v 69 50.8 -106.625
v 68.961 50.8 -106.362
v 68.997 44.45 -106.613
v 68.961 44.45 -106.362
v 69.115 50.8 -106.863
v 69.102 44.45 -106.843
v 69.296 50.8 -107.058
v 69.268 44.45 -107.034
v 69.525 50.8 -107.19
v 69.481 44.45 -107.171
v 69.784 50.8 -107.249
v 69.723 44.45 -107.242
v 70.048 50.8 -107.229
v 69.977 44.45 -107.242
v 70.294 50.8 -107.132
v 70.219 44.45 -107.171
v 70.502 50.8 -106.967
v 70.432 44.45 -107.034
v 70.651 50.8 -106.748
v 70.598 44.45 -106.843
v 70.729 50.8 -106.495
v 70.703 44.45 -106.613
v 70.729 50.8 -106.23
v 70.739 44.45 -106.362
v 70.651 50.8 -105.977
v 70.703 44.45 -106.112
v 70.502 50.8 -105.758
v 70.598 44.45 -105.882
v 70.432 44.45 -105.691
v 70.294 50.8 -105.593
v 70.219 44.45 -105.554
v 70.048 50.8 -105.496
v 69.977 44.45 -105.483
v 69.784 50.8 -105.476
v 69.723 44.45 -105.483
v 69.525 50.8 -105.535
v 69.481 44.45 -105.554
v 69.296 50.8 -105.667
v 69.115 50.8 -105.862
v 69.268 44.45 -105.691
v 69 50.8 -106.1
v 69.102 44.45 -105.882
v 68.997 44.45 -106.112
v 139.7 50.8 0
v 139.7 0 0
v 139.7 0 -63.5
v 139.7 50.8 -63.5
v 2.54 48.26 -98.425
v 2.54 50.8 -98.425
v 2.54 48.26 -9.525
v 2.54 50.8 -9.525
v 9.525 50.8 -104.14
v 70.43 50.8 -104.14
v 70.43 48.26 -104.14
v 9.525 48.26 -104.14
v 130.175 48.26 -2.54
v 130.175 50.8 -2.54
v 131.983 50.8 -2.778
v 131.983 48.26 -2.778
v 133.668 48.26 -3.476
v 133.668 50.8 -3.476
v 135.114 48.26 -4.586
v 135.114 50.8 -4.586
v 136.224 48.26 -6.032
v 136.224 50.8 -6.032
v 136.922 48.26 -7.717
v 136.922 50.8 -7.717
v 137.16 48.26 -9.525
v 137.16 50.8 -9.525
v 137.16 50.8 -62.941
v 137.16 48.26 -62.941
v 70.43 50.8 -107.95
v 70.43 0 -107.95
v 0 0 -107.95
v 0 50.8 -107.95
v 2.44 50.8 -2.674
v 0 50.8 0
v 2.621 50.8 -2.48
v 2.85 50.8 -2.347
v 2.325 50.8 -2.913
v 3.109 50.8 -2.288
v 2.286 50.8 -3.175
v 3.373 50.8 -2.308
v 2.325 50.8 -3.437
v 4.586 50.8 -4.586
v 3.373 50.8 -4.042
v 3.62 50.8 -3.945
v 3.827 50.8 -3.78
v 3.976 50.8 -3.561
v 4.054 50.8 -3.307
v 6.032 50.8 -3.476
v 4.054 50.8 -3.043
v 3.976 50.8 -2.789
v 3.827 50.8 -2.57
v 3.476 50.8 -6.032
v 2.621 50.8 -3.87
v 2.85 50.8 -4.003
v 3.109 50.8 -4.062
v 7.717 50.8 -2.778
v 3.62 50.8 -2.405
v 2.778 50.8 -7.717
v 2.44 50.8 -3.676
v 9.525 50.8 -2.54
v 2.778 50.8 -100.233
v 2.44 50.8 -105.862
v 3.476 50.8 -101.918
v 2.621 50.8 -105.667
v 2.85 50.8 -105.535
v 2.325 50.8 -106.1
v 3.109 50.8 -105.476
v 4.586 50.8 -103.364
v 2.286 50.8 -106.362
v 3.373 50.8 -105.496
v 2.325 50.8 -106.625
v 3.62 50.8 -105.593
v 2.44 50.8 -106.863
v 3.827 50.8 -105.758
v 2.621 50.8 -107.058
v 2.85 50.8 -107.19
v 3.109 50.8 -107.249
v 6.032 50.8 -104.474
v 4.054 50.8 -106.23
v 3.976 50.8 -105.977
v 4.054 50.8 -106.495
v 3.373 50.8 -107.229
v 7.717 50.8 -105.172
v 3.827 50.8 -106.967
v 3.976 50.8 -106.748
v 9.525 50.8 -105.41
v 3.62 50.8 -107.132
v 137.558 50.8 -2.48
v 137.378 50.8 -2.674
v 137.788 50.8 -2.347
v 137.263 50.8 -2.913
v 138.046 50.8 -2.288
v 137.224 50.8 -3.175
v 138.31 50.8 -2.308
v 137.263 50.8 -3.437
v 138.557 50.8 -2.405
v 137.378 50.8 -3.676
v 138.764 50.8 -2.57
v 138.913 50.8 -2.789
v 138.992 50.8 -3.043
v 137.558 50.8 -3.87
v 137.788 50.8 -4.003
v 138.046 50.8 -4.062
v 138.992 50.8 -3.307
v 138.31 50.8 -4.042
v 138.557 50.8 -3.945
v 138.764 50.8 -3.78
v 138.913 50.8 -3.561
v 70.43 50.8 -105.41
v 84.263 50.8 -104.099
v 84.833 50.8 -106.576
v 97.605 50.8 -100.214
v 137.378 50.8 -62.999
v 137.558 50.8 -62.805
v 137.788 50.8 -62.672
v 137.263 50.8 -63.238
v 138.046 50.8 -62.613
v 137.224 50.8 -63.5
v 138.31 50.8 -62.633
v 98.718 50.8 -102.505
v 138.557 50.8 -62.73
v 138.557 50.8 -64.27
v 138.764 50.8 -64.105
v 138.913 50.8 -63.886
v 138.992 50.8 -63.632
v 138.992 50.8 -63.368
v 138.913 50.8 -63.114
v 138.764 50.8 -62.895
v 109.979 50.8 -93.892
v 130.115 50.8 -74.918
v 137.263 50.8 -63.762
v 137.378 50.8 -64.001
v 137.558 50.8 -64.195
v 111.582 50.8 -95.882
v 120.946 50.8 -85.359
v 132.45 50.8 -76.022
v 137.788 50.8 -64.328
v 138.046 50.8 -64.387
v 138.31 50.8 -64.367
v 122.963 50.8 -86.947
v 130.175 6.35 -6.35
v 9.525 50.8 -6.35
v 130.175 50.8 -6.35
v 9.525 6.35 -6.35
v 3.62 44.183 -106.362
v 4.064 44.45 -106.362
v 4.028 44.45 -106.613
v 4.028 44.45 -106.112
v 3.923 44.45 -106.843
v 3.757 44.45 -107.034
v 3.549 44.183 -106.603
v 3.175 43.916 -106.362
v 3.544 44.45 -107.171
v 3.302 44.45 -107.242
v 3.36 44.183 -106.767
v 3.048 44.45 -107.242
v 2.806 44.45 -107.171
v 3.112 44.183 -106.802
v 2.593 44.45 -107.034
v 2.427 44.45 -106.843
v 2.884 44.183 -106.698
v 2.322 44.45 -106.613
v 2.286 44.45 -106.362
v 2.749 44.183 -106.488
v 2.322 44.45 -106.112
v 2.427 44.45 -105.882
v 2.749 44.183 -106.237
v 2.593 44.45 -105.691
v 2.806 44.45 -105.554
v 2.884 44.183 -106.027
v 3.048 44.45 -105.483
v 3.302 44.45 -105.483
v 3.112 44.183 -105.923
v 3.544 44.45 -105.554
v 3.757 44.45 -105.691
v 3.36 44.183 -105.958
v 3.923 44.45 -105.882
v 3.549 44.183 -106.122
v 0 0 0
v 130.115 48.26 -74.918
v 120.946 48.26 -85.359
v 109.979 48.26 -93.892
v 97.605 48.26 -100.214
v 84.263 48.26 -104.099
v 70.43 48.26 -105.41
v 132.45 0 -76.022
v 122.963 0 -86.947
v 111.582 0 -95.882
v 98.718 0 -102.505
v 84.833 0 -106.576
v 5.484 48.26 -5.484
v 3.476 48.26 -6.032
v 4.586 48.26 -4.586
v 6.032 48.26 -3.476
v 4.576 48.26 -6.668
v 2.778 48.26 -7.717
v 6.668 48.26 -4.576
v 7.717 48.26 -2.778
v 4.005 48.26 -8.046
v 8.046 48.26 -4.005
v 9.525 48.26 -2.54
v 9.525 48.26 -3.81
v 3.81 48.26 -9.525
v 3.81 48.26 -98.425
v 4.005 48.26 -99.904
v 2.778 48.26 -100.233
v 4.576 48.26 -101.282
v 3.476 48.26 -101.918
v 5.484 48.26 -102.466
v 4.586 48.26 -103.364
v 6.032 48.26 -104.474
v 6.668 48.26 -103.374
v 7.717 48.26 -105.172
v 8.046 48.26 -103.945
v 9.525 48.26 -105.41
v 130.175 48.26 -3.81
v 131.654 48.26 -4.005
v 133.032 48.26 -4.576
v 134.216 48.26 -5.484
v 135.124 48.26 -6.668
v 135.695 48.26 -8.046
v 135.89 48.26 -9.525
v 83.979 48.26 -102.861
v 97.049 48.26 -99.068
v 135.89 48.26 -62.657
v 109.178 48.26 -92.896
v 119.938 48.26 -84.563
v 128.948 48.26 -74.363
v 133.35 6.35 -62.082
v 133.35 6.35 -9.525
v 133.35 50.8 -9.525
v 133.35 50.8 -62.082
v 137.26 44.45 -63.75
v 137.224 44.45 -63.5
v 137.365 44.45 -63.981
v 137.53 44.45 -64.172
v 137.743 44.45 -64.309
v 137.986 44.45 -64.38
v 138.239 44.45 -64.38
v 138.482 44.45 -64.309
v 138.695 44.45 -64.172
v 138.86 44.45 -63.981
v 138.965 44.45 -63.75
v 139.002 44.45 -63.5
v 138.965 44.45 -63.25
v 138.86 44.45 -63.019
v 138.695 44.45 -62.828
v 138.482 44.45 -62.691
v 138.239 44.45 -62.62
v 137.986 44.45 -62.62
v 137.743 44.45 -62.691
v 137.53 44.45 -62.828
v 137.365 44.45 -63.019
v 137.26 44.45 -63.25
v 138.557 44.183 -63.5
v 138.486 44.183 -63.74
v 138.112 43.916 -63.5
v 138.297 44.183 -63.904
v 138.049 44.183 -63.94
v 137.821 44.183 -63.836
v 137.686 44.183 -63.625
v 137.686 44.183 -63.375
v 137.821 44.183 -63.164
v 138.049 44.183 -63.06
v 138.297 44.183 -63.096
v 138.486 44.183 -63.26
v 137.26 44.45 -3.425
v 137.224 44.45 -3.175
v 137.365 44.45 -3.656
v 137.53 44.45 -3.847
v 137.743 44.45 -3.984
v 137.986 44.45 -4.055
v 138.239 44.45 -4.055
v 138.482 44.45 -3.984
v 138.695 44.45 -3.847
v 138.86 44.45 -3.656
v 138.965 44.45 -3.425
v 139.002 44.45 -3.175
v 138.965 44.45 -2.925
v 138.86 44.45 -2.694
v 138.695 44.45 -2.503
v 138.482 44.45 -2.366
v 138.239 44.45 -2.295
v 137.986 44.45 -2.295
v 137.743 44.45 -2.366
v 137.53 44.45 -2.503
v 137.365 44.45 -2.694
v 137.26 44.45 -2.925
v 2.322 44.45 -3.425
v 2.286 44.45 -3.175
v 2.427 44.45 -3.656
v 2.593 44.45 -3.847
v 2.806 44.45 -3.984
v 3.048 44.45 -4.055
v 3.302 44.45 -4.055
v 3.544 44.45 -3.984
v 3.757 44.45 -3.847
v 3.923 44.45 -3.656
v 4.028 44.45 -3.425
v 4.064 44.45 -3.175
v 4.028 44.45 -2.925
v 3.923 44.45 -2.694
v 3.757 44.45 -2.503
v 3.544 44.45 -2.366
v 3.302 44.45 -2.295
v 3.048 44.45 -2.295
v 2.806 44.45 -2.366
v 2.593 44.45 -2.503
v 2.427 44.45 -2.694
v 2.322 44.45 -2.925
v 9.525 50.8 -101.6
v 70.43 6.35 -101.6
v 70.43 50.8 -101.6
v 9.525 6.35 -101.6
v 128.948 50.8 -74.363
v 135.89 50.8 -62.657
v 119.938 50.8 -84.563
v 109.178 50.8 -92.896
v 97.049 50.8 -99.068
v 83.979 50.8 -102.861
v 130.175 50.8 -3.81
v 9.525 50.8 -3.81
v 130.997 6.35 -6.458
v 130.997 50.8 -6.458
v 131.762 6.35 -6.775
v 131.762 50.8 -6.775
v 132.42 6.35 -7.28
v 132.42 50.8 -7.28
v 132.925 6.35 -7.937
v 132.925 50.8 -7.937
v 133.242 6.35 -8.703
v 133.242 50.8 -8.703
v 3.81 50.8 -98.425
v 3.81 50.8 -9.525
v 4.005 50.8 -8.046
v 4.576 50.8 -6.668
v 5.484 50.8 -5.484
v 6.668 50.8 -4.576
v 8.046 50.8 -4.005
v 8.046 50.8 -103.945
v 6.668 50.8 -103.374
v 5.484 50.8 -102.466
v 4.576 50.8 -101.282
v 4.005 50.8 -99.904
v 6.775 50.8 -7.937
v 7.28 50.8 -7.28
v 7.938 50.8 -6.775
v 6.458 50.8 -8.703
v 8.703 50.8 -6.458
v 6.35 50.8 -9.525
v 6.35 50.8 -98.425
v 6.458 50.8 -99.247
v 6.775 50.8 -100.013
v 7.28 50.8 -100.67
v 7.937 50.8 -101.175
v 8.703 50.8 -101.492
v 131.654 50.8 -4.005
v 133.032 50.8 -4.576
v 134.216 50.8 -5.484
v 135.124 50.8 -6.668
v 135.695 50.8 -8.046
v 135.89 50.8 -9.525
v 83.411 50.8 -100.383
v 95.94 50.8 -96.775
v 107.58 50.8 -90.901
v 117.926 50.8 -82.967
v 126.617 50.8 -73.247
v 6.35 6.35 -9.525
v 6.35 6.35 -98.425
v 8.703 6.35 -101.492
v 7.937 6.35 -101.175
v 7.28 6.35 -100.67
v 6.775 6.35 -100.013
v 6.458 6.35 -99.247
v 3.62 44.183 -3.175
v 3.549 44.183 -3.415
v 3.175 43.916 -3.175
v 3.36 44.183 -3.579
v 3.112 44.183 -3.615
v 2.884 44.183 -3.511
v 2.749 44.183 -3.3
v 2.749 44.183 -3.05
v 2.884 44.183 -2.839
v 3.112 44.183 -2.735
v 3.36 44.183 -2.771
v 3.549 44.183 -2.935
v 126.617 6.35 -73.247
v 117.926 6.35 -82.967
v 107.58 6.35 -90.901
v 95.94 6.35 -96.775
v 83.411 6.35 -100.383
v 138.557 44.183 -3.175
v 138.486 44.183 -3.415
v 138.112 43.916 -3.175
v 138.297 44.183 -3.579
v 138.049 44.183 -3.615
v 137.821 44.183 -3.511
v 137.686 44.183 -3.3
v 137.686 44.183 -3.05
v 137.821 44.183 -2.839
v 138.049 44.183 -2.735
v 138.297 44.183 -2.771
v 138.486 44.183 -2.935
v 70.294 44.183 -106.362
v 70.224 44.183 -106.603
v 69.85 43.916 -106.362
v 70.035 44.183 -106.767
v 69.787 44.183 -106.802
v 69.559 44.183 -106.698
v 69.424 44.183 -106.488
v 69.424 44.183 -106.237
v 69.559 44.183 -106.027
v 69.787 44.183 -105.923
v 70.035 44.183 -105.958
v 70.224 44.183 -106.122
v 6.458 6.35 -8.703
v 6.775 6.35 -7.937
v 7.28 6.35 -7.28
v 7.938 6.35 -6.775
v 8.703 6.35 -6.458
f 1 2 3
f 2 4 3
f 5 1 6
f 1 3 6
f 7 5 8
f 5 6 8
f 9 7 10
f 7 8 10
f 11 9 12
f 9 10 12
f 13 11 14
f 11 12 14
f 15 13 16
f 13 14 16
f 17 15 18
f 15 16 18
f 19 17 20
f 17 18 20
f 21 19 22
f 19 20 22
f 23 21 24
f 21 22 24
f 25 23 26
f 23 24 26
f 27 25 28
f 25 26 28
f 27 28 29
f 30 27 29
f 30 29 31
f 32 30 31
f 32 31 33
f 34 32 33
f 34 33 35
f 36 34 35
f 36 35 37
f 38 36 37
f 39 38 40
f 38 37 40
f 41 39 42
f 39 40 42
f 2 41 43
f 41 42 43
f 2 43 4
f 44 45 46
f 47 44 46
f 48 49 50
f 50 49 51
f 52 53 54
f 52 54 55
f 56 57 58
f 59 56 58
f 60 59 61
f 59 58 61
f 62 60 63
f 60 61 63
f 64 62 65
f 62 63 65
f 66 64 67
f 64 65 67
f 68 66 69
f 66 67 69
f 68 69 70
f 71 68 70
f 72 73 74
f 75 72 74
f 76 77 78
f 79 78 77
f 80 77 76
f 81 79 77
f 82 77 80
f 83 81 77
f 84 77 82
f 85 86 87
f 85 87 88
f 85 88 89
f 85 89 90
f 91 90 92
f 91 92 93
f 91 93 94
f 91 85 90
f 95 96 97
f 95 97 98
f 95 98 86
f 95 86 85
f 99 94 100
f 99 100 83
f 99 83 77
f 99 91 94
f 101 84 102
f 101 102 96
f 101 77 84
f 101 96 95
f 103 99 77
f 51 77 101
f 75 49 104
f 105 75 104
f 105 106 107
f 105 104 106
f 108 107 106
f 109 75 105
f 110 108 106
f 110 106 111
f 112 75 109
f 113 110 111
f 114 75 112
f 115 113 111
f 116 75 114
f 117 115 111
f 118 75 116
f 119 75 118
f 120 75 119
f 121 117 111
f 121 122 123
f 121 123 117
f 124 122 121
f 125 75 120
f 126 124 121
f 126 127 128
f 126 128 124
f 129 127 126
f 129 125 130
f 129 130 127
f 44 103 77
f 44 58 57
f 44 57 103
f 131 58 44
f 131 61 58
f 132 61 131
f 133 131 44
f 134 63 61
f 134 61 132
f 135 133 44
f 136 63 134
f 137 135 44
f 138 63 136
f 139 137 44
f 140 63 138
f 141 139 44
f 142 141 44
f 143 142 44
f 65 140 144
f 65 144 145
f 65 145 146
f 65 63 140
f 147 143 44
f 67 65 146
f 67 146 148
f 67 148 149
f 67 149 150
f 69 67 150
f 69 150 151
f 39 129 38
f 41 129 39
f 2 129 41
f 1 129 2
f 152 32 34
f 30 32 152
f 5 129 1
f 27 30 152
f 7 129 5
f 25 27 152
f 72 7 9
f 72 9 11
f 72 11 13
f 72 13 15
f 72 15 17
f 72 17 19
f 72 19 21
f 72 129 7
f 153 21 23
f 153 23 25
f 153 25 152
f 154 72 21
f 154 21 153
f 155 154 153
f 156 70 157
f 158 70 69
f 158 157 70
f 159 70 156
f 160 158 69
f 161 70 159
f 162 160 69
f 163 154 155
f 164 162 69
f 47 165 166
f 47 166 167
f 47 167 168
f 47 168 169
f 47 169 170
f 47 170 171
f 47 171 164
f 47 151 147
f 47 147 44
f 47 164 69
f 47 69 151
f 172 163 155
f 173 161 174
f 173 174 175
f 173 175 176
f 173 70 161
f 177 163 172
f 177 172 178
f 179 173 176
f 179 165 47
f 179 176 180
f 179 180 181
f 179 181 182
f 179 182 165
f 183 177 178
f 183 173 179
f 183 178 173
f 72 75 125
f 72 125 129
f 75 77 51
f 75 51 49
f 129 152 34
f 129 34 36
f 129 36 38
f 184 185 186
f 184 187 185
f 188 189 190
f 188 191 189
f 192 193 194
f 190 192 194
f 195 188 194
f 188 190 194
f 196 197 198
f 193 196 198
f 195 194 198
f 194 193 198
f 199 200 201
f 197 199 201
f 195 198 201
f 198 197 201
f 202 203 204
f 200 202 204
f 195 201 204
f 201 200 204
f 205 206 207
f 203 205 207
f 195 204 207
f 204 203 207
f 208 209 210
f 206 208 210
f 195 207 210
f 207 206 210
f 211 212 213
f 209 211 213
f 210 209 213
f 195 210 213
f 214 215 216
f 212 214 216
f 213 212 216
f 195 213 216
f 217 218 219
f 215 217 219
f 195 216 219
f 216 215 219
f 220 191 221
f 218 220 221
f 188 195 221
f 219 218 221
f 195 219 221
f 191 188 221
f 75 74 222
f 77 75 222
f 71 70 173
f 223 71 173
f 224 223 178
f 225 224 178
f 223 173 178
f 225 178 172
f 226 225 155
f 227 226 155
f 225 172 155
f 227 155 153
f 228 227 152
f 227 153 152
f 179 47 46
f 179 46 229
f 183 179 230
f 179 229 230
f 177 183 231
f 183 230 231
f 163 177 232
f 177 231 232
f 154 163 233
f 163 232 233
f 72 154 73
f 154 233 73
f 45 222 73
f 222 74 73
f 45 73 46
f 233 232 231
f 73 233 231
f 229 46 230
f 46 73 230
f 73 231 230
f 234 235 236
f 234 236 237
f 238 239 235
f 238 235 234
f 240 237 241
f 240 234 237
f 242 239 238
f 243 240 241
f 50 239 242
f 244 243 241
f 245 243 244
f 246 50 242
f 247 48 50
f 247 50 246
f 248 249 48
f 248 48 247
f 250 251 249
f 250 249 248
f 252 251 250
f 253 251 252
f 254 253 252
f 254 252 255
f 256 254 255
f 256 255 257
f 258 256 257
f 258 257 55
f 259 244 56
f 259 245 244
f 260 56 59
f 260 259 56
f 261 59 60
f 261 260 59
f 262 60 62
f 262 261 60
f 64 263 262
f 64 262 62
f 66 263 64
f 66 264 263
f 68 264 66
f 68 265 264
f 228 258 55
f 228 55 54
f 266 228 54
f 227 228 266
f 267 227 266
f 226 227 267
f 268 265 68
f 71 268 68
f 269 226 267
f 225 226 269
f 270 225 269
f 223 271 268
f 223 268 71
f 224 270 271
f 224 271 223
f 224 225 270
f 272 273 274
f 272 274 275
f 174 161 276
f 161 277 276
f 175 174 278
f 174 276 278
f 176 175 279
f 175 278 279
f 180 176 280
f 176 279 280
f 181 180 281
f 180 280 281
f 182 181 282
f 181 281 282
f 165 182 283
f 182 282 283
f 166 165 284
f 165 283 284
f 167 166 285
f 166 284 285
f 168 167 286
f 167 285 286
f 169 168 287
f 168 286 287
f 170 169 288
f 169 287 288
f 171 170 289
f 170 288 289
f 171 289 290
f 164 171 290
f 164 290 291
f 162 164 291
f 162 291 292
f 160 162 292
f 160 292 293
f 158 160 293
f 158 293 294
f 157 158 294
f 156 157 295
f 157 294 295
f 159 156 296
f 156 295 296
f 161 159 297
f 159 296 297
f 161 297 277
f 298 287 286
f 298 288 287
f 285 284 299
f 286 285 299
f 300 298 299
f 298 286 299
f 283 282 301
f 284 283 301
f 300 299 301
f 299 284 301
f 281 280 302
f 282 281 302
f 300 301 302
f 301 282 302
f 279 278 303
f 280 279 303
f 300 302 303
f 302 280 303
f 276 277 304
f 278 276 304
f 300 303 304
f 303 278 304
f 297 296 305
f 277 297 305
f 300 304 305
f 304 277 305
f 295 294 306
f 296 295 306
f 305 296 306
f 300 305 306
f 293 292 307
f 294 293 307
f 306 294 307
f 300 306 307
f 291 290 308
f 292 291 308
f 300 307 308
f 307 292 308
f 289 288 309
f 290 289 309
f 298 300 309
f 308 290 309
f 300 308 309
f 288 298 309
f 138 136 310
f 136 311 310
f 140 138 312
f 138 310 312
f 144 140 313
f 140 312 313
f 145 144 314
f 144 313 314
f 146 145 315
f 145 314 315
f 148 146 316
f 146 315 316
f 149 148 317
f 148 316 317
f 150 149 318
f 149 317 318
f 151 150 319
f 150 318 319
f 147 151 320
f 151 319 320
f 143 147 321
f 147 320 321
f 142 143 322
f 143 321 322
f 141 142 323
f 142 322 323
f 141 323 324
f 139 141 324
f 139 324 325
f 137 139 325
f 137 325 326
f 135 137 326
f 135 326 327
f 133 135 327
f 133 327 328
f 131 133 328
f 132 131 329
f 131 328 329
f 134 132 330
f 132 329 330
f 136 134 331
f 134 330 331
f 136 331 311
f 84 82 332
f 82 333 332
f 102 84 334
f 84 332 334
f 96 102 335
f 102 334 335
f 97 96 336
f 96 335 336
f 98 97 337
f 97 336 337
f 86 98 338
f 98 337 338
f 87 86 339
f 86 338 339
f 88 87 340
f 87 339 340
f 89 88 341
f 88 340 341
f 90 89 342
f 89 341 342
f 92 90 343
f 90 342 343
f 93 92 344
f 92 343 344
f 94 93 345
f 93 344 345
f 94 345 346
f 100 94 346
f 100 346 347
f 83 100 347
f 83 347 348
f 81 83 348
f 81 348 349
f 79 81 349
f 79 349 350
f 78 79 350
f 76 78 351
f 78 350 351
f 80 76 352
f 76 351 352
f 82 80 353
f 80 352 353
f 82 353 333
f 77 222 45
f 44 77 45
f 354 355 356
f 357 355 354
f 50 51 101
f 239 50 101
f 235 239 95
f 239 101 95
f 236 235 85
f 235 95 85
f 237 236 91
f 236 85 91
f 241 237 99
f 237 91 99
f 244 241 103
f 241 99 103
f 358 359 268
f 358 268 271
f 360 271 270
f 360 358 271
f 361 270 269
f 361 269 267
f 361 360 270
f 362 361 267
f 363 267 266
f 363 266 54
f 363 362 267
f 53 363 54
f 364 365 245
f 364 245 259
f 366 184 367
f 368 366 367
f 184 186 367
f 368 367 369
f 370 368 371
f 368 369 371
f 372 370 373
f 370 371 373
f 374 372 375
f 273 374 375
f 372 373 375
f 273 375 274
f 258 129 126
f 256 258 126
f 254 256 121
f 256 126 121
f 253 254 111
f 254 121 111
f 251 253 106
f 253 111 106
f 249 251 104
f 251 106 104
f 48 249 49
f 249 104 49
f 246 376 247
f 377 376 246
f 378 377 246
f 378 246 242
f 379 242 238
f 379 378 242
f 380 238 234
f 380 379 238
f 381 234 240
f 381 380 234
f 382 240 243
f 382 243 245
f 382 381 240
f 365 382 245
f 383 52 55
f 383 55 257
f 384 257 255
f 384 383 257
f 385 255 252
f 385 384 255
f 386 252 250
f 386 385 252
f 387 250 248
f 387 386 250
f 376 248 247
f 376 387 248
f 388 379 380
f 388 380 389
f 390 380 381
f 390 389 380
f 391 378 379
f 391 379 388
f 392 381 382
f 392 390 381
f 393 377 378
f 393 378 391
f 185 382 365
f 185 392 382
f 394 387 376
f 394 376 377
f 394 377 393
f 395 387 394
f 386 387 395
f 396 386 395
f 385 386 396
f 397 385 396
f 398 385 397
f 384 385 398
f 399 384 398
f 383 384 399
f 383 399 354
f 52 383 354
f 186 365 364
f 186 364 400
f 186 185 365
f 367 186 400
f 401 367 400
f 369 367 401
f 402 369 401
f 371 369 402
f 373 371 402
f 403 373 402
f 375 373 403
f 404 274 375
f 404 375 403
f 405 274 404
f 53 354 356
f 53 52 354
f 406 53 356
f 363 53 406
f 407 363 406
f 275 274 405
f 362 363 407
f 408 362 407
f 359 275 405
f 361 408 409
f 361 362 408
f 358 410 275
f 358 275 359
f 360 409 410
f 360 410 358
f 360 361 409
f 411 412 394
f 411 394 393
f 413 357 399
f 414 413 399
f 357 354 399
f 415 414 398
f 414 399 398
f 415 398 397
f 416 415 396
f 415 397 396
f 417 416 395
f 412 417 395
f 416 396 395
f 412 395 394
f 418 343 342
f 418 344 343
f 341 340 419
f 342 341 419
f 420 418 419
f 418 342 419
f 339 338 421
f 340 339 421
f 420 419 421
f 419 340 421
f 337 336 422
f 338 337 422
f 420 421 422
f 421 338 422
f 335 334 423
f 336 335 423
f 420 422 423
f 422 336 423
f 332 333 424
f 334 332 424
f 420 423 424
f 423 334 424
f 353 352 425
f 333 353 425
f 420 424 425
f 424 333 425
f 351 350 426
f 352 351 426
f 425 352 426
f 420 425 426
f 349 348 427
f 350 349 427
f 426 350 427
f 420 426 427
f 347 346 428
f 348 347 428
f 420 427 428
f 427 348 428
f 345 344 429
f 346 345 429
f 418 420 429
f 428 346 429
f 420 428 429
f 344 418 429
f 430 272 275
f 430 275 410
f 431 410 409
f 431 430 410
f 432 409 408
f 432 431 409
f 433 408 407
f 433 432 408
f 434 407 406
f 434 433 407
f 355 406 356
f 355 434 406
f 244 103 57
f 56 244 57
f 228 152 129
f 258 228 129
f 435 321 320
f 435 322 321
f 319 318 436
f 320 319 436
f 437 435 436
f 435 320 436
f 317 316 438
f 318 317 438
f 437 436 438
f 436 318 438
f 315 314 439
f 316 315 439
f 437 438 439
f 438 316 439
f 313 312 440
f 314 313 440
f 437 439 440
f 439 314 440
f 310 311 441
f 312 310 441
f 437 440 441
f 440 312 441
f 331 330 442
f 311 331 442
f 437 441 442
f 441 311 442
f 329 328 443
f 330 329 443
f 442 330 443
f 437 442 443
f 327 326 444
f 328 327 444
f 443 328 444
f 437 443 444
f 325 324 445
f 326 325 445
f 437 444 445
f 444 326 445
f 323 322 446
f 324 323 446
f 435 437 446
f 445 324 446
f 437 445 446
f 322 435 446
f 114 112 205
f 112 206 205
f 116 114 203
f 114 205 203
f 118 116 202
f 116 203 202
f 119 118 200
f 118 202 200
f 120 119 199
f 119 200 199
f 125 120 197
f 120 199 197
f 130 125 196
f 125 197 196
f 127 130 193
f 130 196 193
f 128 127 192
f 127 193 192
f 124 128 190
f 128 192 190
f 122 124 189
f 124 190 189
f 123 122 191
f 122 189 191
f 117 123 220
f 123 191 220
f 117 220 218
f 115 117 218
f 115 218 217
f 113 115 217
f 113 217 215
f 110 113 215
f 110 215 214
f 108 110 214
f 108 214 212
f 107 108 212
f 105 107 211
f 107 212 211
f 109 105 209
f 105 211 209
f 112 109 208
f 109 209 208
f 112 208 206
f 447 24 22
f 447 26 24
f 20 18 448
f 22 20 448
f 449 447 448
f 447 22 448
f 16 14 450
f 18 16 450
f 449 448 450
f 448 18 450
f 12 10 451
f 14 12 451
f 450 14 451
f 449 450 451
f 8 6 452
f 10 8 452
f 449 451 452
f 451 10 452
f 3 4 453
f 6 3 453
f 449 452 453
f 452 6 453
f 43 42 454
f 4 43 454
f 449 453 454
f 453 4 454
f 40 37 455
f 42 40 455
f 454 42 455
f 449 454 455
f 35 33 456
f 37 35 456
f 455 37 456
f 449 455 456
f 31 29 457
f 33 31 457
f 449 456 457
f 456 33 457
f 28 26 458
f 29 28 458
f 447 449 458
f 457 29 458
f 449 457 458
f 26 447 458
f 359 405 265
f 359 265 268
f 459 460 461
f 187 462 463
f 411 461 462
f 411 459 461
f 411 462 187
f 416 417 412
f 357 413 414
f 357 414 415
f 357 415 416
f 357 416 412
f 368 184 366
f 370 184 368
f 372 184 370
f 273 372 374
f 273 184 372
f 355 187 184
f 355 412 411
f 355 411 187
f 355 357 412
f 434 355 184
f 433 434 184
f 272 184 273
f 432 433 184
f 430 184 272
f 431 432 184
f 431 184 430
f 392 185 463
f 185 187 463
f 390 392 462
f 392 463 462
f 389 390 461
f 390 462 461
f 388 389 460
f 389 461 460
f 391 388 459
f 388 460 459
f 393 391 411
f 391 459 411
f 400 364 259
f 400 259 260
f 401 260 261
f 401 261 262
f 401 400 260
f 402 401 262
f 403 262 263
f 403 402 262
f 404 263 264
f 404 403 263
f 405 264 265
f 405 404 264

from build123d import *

# Parameters (mm, degrees)
BOSS_EXTRUDE1_DEPTH       = 50.8
SHELL1_T                  = -6.35
FILLET1_R                 = 3.175
CUT_EXTRUDE1_DEPTH        = 2.54
F_2_64_TAPPED_HOLE1_D     = 1.778
F_2_64_TAPPED_HOLE1_DEPTH = 6.35
F_2_64_TAPPED_HOLE1_TIP   = 0.53416509


with BuildPart() as part:
    # Sketch2 → Boss-Extrude1 (new body)
    with BuildSketch(Plane(origin=(0, 0, 0), x_dir=(1, 0, 0), z_dir=(0, 1, 0))):
        with BuildLine():
            Line((0, 0), (139.7, 0))
            Line((139.7, 0), (139.7, 63.5))
            ThreePointArc((139.7, 63.5), (111.582381507, 95.881856359), (70.429678072, 107.95))
            Line((70.429678072, 107.95), (0, 107.95))
            Line((0, 107.95), (0, 0))
        make_face()
    extrude(amount=BOSS_EXTRUDE1_DEPTH)

    # Shell1
    shell1_openings = [part.faces().sort_by_distance(p)[0] for p in [
        (71.269444109, 50.8, -57.911371272),
    ]]
    offset(amount=SHELL1_T, openings=shell1_openings, kind=Kind.INTERSECTION)

    # Fillet1
    fillet1_edges = [part.edges().sort_by_distance(p)[0] for p in [
        (6.35, 28.575, -101.6),
        (6.35, 28.575, -6.35),
        (133.35, 28.575, -6.35),
    ]]
    fillet(fillet1_edges, radius=FILLET1_R)

    # Sketch4 → Cut-Extrude1 (cut)
    with BuildSketch(Plane(origin=(0, 50.8, 0), x_dir=(1, 0, 0), z_dir=(0, 1, 0))):
        with BuildLine():
            Line((2.54, 98.425), (2.54, 9.525))
            ThreePointArc((2.54, 9.525), (4.585859133, 4.585859133), (9.525, 2.54))
            Line((9.525, 2.54), (130.175, 2.54))
            ThreePointArc((130.175, 2.54), (135.114140867, 4.585859133), (137.16, 9.525))
            Line((137.16, 9.525), (137.16, 62.940699502))
            ThreePointArc((137.16, 62.940699502), (109.97894276, 93.892185853), (70.429678072, 105.41))
            Line((70.429678072, 105.41), (9.525, 105.41))
            ThreePointArc((9.525, 105.41), (4.585859133, 103.364140867), (2.54, 98.425))
        make_face()
        with BuildLine():
            Line((9.525, 3.81), (130.175, 3.81))
            ThreePointArc((130.175, 3.81), (134.216115254, 5.483884746), (135.89, 9.525))
            Line((135.89, 9.525), (135.89, 62.657254053))
            ThreePointArc((135.89, 62.657254053), (109.178458563, 92.896088268), (70.429678072, 104.14))
            Line((70.429678072, 104.14), (9.525, 104.14))
            ThreePointArc((9.525, 104.14), (5.483884746, 102.466115254), (3.81, 98.425))
            Line((3.81, 98.425), (3.81, 9.525))
            ThreePointArc((3.81, 9.525), (5.483884746, 5.483884746), (9.525, 3.81))
        make_face(mode=Mode.SUBTRACT)
    extrude(amount=-CUT_EXTRUDE1_DEPTH, mode=Mode.SUBTRACT)

    # #2-64 Tapped Hole1
    with Locations(Plane(origin=(0, 50.8, 0), x_dir=(1, 0, 0), z_dir=(0, 1, 0))):
        with Locations((3.175, 3.175), (3.175, 106.3625), (69.85, 106.3625), (138.1125, 63.5), (138.1125, 3.175)):
            Hole(F_2_64_TAPPED_HOLE1_D / 2, depth=F_2_64_TAPPED_HOLE1_DEPTH)
            with Locations((0, 0, -(F_2_64_TAPPED_HOLE1_DEPTH + F_2_64_TAPPED_HOLE1_TIP / 2))):  # 118° drill point
                Cone(0, F_2_64_TAPPED_HOLE1_D / 2, F_2_64_TAPPED_HOLE1_TIP, mode=Mode.SUBTRACT)


solid = part.part
